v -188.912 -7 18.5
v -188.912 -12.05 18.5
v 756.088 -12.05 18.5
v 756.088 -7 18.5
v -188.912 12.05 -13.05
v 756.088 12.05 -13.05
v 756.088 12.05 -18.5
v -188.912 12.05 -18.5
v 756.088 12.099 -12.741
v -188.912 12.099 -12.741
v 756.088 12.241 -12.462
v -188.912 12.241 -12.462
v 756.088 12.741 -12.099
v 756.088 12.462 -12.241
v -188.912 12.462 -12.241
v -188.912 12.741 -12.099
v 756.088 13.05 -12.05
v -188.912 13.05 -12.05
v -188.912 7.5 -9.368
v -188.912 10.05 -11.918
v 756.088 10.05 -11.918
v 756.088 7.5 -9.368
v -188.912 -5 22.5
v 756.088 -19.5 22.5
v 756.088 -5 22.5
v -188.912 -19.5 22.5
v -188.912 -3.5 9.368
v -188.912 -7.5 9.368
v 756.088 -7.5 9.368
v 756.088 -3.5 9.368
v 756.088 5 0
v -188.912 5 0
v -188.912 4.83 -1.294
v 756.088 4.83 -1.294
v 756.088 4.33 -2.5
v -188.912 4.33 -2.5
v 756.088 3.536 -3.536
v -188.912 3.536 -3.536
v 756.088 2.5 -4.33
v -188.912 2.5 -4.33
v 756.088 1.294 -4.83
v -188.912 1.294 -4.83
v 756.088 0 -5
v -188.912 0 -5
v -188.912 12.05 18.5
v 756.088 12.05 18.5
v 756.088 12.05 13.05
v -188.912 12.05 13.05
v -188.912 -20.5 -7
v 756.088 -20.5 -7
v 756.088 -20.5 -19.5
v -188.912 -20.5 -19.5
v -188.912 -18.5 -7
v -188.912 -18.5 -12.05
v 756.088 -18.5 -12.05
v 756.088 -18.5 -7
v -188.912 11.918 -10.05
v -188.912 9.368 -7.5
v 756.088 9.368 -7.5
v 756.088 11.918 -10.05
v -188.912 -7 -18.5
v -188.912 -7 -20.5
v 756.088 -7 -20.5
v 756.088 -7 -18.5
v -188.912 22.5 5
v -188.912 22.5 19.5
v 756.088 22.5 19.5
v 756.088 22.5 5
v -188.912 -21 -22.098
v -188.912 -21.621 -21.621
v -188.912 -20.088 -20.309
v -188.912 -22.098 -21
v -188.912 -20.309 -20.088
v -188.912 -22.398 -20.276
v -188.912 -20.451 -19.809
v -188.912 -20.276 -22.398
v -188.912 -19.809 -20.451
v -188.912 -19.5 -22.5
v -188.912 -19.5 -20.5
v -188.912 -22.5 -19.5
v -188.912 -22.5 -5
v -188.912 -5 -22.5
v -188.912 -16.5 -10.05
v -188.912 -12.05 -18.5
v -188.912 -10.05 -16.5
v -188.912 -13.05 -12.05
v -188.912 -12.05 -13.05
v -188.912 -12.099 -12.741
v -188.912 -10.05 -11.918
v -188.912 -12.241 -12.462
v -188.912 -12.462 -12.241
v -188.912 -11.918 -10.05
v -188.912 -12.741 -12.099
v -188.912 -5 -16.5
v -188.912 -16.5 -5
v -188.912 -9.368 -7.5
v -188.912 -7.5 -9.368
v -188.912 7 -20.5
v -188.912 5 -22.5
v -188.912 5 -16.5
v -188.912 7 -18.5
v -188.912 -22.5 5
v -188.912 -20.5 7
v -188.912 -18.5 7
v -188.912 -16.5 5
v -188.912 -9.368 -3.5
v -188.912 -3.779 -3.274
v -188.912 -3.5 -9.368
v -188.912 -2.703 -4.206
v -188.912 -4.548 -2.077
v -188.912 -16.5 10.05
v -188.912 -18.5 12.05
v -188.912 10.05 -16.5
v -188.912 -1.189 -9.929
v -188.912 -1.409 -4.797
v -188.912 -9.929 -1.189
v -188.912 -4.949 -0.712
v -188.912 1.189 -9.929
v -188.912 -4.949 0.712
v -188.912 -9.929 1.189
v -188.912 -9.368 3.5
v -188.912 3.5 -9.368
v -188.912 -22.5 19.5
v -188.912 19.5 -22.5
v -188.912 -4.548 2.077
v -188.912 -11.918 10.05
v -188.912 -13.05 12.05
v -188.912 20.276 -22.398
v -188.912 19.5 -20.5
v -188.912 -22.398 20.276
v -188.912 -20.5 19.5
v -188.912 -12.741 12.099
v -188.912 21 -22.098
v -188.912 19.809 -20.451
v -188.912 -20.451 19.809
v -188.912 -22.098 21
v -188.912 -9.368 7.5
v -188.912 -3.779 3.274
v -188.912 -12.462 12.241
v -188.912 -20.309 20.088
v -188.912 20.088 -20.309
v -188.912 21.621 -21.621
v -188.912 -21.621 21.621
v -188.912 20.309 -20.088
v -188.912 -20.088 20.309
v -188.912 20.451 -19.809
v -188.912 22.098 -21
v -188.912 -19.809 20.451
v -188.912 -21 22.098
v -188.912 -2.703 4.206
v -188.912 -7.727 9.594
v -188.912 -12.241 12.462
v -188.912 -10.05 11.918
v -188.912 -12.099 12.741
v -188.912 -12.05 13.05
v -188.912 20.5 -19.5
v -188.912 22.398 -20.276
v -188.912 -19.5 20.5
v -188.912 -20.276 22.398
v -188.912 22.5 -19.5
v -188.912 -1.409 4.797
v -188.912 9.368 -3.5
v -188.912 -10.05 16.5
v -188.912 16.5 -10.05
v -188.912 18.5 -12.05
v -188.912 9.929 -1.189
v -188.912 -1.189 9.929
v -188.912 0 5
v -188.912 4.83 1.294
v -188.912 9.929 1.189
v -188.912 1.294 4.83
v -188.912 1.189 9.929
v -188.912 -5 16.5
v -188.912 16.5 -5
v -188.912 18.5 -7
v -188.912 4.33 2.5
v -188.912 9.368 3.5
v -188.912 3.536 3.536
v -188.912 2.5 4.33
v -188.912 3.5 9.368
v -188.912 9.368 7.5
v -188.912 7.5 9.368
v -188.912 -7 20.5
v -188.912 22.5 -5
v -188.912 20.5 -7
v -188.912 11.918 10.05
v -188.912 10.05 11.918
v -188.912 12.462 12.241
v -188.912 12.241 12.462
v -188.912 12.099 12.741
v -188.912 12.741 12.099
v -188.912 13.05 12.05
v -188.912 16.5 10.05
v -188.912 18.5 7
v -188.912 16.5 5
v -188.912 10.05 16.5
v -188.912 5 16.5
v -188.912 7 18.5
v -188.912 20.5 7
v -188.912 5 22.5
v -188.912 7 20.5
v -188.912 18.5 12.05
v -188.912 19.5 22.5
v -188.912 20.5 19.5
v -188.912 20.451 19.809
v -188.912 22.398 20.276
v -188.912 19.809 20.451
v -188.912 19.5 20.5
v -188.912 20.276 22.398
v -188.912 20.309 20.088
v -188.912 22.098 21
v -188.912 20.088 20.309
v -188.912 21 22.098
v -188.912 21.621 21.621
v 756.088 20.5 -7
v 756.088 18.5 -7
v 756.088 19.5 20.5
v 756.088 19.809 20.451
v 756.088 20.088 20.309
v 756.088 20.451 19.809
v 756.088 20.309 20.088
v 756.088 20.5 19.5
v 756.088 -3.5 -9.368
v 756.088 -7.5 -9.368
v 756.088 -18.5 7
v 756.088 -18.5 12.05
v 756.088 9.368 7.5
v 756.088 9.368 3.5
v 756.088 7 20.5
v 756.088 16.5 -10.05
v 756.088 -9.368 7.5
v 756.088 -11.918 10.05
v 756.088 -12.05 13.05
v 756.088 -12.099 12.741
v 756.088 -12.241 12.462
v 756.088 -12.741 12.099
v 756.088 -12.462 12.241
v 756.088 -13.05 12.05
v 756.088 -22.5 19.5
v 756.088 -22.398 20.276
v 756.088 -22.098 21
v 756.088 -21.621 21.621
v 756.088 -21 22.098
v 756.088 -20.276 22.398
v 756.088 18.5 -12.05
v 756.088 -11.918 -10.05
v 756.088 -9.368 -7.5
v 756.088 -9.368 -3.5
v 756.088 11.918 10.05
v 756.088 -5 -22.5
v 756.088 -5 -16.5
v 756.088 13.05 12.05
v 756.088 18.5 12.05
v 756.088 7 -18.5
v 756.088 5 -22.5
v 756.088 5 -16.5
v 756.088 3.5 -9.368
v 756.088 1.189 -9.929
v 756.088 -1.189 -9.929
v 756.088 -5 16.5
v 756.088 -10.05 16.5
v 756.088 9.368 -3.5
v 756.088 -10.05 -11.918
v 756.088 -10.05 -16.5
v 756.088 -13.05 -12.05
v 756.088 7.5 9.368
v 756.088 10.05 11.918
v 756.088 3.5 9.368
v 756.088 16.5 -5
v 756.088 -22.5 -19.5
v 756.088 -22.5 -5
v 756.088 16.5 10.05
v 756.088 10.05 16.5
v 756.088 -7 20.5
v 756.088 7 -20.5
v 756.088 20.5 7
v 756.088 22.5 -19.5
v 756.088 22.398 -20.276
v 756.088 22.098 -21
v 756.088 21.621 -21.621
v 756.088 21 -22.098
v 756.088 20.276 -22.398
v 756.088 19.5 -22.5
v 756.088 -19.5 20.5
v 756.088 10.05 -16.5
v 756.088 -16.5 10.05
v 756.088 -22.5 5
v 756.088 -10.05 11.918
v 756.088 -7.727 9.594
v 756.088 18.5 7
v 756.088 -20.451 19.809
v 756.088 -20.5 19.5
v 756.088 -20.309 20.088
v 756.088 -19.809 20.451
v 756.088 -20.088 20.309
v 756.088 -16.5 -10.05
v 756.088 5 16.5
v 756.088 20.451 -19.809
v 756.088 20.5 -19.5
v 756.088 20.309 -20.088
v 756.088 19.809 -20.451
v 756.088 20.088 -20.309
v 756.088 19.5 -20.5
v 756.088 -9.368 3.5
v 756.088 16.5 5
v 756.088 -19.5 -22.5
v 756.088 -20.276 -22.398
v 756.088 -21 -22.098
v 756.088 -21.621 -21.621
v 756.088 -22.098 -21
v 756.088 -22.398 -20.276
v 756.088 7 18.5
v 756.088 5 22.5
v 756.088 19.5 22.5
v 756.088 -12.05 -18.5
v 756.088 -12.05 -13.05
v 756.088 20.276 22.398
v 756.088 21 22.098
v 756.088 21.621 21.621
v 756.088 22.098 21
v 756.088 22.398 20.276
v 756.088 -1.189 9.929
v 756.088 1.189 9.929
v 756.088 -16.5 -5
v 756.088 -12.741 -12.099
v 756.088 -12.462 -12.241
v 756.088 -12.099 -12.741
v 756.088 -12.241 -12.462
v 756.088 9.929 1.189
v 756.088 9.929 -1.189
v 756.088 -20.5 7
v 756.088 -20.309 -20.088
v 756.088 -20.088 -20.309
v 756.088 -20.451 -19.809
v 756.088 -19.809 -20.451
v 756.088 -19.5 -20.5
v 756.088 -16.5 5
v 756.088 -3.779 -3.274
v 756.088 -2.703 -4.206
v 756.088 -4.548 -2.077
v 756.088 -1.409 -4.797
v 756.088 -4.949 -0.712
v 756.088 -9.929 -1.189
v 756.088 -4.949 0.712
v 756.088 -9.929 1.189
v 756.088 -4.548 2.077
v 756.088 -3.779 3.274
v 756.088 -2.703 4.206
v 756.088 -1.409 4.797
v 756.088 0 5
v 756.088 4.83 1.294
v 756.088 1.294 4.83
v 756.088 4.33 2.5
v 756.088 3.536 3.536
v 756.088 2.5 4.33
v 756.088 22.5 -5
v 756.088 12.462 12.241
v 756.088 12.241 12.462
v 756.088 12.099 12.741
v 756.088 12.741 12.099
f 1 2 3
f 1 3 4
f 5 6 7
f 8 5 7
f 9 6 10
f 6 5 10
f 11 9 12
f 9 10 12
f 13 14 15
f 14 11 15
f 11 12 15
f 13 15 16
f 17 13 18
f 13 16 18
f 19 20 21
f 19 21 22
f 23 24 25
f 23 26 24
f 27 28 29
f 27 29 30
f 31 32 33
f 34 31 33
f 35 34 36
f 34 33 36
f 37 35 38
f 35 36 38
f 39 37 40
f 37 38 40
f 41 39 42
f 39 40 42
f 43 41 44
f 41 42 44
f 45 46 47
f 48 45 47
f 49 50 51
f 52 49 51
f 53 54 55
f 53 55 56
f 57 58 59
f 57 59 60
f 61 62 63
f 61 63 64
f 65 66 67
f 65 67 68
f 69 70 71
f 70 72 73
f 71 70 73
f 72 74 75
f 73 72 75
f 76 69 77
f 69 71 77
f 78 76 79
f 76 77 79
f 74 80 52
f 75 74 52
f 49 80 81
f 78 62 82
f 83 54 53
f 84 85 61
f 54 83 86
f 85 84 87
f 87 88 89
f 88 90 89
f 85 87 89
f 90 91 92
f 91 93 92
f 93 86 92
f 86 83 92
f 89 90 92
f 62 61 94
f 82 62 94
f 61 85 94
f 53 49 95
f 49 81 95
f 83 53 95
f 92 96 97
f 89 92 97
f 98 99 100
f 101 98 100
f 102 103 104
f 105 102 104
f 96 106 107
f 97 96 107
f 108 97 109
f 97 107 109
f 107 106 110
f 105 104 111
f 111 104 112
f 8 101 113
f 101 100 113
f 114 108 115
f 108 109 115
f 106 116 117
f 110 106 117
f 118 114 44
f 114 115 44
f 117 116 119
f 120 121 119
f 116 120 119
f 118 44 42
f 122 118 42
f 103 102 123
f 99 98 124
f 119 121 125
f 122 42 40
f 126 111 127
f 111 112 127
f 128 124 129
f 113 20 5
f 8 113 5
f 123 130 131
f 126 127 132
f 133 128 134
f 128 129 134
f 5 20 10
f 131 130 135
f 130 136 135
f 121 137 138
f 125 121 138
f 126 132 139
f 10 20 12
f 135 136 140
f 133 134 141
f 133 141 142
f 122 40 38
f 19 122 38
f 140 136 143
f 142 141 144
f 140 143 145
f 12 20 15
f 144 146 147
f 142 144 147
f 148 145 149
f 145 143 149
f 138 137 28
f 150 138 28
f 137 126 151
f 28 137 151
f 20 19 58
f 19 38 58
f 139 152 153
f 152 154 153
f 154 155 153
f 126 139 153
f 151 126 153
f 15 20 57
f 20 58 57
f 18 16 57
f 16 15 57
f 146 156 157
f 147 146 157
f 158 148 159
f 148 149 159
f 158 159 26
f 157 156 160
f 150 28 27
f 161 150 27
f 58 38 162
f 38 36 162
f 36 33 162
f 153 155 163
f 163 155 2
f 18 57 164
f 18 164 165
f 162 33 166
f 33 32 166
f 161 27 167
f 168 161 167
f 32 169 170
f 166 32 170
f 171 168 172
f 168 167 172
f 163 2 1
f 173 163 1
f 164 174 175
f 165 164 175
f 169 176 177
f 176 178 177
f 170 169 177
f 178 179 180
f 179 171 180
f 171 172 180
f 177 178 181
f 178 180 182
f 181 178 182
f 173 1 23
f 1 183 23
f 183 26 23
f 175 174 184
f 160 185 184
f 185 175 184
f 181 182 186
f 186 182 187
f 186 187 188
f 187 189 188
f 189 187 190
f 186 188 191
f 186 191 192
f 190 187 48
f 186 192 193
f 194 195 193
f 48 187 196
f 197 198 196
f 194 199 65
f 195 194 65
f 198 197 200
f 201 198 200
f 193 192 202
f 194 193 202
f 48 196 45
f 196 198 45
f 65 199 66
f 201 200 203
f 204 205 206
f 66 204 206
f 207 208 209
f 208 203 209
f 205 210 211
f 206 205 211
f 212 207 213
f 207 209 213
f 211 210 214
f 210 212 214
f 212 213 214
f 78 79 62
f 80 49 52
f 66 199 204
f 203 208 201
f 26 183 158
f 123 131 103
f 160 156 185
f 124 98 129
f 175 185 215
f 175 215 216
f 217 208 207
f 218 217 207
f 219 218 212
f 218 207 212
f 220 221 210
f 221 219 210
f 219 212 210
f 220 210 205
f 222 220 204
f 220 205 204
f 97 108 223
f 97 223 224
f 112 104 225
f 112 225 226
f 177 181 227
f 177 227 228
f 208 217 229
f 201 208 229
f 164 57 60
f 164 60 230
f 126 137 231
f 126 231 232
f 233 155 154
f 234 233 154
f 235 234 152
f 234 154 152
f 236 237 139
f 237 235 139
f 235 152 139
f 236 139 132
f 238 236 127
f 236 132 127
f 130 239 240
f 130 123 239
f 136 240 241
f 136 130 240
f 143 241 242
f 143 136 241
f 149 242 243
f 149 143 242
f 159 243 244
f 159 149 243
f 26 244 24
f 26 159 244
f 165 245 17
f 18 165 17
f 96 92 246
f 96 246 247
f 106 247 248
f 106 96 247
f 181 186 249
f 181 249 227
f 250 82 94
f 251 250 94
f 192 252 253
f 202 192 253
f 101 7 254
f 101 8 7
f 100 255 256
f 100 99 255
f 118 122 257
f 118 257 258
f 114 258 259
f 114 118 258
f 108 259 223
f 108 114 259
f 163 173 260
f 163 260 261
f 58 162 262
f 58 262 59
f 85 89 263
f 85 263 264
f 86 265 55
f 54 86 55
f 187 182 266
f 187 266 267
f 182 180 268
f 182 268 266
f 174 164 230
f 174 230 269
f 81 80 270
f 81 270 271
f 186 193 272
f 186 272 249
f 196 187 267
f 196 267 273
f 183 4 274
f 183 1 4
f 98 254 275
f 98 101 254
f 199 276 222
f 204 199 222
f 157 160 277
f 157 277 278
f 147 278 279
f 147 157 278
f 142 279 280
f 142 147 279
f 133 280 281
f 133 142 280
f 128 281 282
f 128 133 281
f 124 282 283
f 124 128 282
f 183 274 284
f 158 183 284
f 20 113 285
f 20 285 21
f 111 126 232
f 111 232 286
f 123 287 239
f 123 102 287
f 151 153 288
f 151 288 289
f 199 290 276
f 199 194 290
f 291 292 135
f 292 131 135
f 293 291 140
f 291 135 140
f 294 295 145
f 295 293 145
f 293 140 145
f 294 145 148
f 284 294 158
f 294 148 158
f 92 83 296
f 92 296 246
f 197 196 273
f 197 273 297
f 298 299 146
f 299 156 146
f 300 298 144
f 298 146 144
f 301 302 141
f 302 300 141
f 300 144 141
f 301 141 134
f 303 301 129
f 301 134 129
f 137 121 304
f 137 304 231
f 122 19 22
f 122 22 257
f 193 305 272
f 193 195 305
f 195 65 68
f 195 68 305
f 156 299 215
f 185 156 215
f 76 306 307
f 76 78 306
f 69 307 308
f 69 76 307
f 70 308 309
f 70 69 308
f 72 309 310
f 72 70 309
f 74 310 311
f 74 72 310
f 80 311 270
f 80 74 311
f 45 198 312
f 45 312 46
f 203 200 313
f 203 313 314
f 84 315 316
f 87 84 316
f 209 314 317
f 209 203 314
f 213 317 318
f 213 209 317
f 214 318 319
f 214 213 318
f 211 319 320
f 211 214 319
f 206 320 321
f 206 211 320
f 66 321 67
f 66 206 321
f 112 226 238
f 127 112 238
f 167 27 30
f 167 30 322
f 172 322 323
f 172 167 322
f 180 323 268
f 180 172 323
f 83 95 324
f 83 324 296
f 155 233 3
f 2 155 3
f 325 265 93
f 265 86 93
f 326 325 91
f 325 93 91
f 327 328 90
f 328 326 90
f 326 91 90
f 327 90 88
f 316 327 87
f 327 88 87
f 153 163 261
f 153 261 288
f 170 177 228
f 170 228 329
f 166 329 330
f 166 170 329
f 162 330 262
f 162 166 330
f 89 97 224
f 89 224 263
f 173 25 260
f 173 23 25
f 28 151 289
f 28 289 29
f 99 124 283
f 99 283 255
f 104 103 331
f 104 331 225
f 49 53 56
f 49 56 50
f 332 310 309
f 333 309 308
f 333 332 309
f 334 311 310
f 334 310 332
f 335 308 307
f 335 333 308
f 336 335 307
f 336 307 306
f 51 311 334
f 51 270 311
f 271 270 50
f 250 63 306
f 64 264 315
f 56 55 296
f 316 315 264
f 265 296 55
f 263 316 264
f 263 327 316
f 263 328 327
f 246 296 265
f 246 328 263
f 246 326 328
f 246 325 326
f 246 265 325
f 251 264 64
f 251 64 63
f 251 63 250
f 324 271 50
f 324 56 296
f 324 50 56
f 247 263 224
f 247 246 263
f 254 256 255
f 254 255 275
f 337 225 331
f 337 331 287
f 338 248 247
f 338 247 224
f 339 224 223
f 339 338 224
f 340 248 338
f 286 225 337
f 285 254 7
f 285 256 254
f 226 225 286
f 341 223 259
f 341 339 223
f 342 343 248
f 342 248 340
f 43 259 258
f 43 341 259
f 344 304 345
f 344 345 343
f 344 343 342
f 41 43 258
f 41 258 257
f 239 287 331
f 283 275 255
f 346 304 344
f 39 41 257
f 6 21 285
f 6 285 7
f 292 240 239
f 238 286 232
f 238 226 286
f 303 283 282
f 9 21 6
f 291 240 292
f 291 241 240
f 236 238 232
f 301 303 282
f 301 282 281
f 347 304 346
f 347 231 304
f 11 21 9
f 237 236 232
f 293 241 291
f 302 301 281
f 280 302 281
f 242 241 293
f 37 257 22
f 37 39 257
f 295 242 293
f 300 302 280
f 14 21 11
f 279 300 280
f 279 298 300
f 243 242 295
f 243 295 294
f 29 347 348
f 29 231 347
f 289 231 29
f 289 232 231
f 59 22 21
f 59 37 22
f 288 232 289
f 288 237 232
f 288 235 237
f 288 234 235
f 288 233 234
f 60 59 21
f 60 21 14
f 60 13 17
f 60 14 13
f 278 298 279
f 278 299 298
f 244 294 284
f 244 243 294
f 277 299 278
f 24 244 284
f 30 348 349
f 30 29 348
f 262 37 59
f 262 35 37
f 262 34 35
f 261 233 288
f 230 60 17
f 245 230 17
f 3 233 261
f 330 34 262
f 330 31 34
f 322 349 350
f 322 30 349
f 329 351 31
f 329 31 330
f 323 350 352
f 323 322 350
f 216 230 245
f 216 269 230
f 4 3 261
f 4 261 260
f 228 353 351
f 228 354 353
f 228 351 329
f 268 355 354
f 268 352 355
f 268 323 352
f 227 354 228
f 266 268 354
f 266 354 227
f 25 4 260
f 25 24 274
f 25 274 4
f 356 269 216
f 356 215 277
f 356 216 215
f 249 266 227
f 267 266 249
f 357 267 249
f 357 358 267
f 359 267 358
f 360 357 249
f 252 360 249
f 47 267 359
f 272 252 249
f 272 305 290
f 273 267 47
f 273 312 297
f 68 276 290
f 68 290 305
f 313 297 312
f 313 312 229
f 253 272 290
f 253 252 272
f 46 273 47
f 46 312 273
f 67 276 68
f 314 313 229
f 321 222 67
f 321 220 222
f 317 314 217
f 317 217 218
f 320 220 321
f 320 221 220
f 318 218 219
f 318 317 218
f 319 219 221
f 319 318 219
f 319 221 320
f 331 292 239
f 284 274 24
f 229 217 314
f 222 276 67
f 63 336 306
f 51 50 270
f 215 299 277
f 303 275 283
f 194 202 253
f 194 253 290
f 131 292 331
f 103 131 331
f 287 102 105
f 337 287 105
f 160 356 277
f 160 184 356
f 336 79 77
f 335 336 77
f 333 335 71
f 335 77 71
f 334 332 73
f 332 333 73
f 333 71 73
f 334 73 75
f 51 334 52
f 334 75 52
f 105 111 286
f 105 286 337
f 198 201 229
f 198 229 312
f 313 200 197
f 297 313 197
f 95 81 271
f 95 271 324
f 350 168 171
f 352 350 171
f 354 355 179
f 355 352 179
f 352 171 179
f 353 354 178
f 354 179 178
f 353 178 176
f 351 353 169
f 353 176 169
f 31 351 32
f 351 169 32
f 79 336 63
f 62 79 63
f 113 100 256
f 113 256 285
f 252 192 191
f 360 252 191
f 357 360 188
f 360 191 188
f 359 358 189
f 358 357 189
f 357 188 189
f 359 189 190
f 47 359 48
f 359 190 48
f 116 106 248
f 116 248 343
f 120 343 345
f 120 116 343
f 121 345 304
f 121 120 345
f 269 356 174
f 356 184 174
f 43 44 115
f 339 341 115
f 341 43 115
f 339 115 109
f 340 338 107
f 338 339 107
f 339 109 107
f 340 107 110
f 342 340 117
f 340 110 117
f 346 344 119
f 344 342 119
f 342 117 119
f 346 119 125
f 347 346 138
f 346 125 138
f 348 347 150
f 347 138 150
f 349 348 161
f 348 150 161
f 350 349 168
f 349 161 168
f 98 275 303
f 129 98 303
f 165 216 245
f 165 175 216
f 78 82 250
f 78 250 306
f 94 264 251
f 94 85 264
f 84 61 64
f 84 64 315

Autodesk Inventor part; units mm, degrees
ref_plane "YZ Plane" through (0, 0, 0) normal (1, 0, 0) x (0, 1, 0)
ref_plane "XZ Plane" through (0, 0, 0) normal (0, 1, 0) x (-1, 0, 0)
ref_plane "Work Plane1" through (-188.9125, 0, 0) normal (1, 0, 0) x (0, 1, 0)
sketch "Sketch1" plane through (-188.9125, 0, 0) normal (1, 0, 0) x (0, 1, 0)
  line L0 (-22.5, -5) -> (-16.5, -5) projected
  line L1 (-16.5, -5) -> (-16.5, -10.05) projected
  line L2 (-16.5, -10.05) -> (-11.9175, -10.05) projected
  line L3 (-11.9175, -10.05) -> (-9.3675, -7.5) projected
  line L4 (-9.3675, -7.5) -> (-9.3675, -3.5) projected
  arc A0 (-9.3675, 3.5) -> (-9.3675, -3.5) centre (0, 0) ccw projected
  line L5 (-9.3675, 3.5) -> (-9.3675, 7.5) projected
  line L6 (-9.3675, 7.5) -> (-11.9175, 10.05) projected
  line L7 (-11.9175, 10.05) -> (-16.5, 10.05) projected
  line L8 (-16.5, 10.05) -> (-16.5, 5) projected
  line L9 (-22.5, 5) -> (-16.5, 5) projected
  line L10 (-22.5, 5) -> (-22.5, 19.5) projected
  arc A1 (-19.5, 22.5) -> (-22.5, 19.5) centre (-19.5, 19.5) ccw projected
  line L11 (-19.5, 22.5) -> (-5, 22.5) projected
  line L12 (-5, 22.5) -> (-5, 16.5) projected
  line L13 (-5, 16.5) -> (-10.05, 16.5) projected
  line L14 (-10.05, 16.5) -> (-10.05, 11.9175) projected
  line L15 (-10.05, 11.9175) -> (-7.5, 9.3675) projected
  line L16 (-7.5, 9.3675) -> (-3.5, 9.3675) projected
  arc A2 (3.5, 9.3675) -> (-3.5, 9.3675) centre (0, 0) ccw projected
  line L17 (3.5, 9.3675) -> (7.5, 9.3675) projected
  line L18 (7.5, 9.3675) -> (10.05, 11.9175) projected
  line L19 (10.05, 11.9175) -> (10.05, 16.5) projected
  line L20 (10.05, 16.5) -> (5, 16.5) projected
  line L21 (5, 22.5) -> (5, 16.5) projected
  line L22 (5, 22.5) -> (19.5, 22.5) projected
  arc A3 (22.5, 19.5) -> (19.5, 22.5) centre (19.5, 19.5) ccw projected
  line L23 (22.5, 19.5) -> (22.5, 5) projected
  line L24 (22.5, 5) -> (16.5, 5) projected
  line L25 (16.5, 5) -> (16.5, 10.05) projected
  line L26 (16.5, 10.05) -> (11.9175, 10.05) projected
  line L27 (11.9175, 10.05) -> (9.3675, 7.5) projected
  line L28 (9.3675, 7.5) -> (9.3675, 3.5) projected
  arc A4 (9.3675, -3.5) -> (9.3675, 3.5) centre (0, 0) ccw projected
  line L29 (9.3675, -3.5) -> (9.3675, -7.5) projected
  line L30 (9.3675, -7.5) -> (11.9175, -10.05) projected
  line L31 (11.9175, -10.05) -> (16.5, -10.05) projected
  line L32 (16.5, -10.05) -> (16.5, -5) projected
  line L33 (22.5, -5) -> (16.5, -5) projected
  line L34 (22.5, -5) -> (22.5, -19.5) projected
  arc A5 (19.5, -22.5) -> (22.5, -19.5) centre (19.5, -19.5) ccw projected
  line L35 (19.5, -22.5) -> (5, -22.5) projected
  line L36 (5, -22.5) -> (5, -16.5) projected
  line L37 (5, -16.5) -> (10.05, -16.5) projected
  line L38 (10.05, -16.5) -> (10.05, -11.9175) projected
  line L39 (10.05, -11.9175) -> (7.5, -9.3675) projected
  line L40 (7.5, -9.3675) -> (3.5, -9.3675) projected
  arc A6 (-3.5, -9.3675) -> (3.5, -9.3675) centre (0, 0) ccw projected
  line L41 (-3.5, -9.3675) -> (-7.5, -9.3675) projected
  line L42 (-7.5, -9.3675) -> (-10.05, -11.9175) projected
  line L43 (-10.05, -11.9175) -> (-10.05, -16.5) projected
  line L44 (-10.05, -16.5) -> (-5, -16.5) projected
  line L45 (-5, -22.5) -> (-5, -16.5) projected
  line L46 (-5, -22.5) -> (-19.5, -22.5) projected
  arc A7 (-22.5, -19.5) -> (-19.5, -22.5) centre (-19.5, -19.5) ccw projected
  line L47 (-22.5, -19.5) -> (-22.5, -5) projected
  arc A8 (0, 5) -> (0, -5) centre (0, 0) ccw projected
  arc A9 (0, -5) -> (0, 5) centre (0, 0) ccw projected
  arc A10 (13.05, -12.05) -> (12.05, -13.05) centre (13.05, -13.05) ccw projected
  line L48 (12.05, -13.05) -> (12.05, -18.5) projected
  line L49 (12.05, -18.5) -> (7, -18.5) projected
  line L50 (7, -18.5) -> (7, -20.5) projected
  line L51 (7, -20.5) -> (19.5, -20.5) projected
  arc A11 (19.5, -20.5) -> (20.5, -19.5) centre (19.5, -19.5) ccw projected
  line L52 (20.5, -19.5) -> (20.5, -7) projected
  line L53 (20.5, -7) -> (18.5, -7) projected
  line L54 (18.5, -7) -> (18.5, -12.05) projected
  line L55 (18.5, -12.05) -> (13.05, -12.05) projected
  arc A12 (-20.5, -19.5) -> (-19.5, -20.5) centre (-19.5, -19.5) ccw projected
  line L56 (-19.5, -20.5) -> (-7, -20.5) projected
  line L57 (-7, -20.5) -> (-7, -18.5) projected
  line L58 (-7, -18.5) -> (-12.05, -18.5) projected
  line L59 (-12.05, -18.5) -> (-12.05, -13.05) projected
  arc A13 (-12.05, -13.05) -> (-13.05, -12.05) centre (-13.05, -13.05) ccw projected
  line L60 (-13.05, -12.05) -> (-18.5, -12.05) projected
  line L61 (-18.5, -12.05) -> (-18.5, -7) projected
  line L62 (-18.5, -7) -> (-20.5, -7) projected
  line L63 (-20.5, -7) -> (-20.5, -19.5) projected
  arc A14 (-19.5, 20.5) -> (-20.5, 19.5) centre (-19.5, 19.5) ccw projected
  line L64 (-20.5, 19.5) -> (-20.5, 7) projected
  line L65 (-20.5, 7) -> (-18.5, 7) projected
  line L66 (-18.5, 7) -> (-18.5, 12.05) projected
  line L67 (-18.5, 12.05) -> (-13.05, 12.05) projected
  arc A15 (-13.05, 12.05) -> (-12.05, 13.05) centre (-13.05, 13.05) ccw projected
  line L68 (-12.05, 13.05) -> (-12.05, 18.5) projected
  line L69 (-12.05, 18.5) -> (-7, 18.5) projected
  line L70 (-7, 18.5) -> (-7, 20.5) projected
  line L71 (-7, 20.5) -> (-19.5, 20.5) projected
  line L72 (7, 18.5) -> (12.05, 18.5) projected
  line L73 (12.05, 18.5) -> (12.05, 13.05) projected
  arc A16 (12.05, 13.05) -> (13.05, 12.05) centre (13.05, 13.05) ccw projected
  line L74 (13.05, 12.05) -> (18.5, 12.05) projected
  line L75 (18.5, 12.05) -> (18.5, 7) projected
  line L76 (18.5, 7) -> (20.5, 7) projected
  line L77 (20.5, 7) -> (20.5, 19.5) projected
  arc A17 (20.5, 19.5) -> (19.5, 20.5) centre (19.5, 19.5) ccw projected
  line L78 (19.5, 20.5) -> (7, 20.5) projected
  line L79 (7, 20.5) -> (7, 18.5) projected
  line L80 (5, -22.5) -> (19.5, -22.5)
  line L81 (19.5, -20.5) -> (7, -20.5)
  line L82 (7, -20.5) -> (7, -18.5)
  line L83 (7, -18.5) -> (12.05, -18.5)
  line L84 (12.05, -18.5) -> (12.05, -13.05)
  line L85 (18.5, -12.05) -> (13.05, -12.05)
  line L86 (18.5, -12.05) -> (18.5, -7)
  line L87 (18.5, -7) -> (20.5, -7)
  line L88 (20.5, -7) -> (20.5, -19.5)
  line L89 (22.5, -19.5) -> (22.5, -5)
  line L90 (22.5, -5) -> (16.5, -5)
  line L91 (11.9175, -10.05) -> (16.5, -10.05)
  line L92 (16.5, -10.05) -> (16.5, -5)
  line L93 (11.9175, -10.05) -> (9.3675, -7.5)
  line L94 (7.5, -9.3675) -> (10.05, -11.9175)
  line L95 (10.05, -11.9175) -> (10.05, -16.5)
  line L96 (10.05, -16.5) -> (5, -16.5)
  line L97 (5, -22.5) -> (5, -16.5)
  line L98 (7.5, -9.3675) -> (3.5, -9.3675)
  line L99 (9.3675, -7.5) -> (9.3675, -3.5)
  line L100 (9.3675, 3.5) -> (9.3675, 7.5)
  line L101 (9.3675, 7.5) -> (11.9175, 10.05)
  line L102 (11.9175, 10.05) -> (16.5, 10.05)
  line L103 (16.5, 10.05) -> (16.5, 5)
  line L104 (16.5, 5) -> (22.5, 5)
  line L105 (22.5, 5) -> (22.5, 19.5)
  line L106 (20.5, 19.5) -> (20.5, 7)
  line L107 (18.5, 7) -> (20.5, 7)
  line L108 (18.5, 7) -> (18.5, 12.05)
  line L109 (18.5, 12.05) -> (13.05, 12.05)
  line L110 (12.05, 13.05) -> (12.05, 18.5)
  line L111 (12.05, 18.5) -> (7, 18.5)
  line L112 (7, 18.5) -> (7, 20.5)
  line L113 (7, 20.5) -> (19.5, 20.5)
  line L114 (19.5, 22.5) -> (5, 22.5)
  line L115 (5, 22.5) -> (5, 16.5)
  line L116 (5, 16.5) -> (10.05, 16.5)
  line L117 (10.05, 16.5) -> (10.05, 11.9175)
  line L118 (10.05, 11.9175) -> (7.5, 9.3675)
  line L119 (7.5, 9.3675) -> (3.5, 9.3675)
  line L120 (-3.5, 9.3675) -> (-7.5, 9.3675)
  line L121 (-7.7267, 9.5942) -> (-10.05, 11.9175)
  line L122 (-10.05, 11.9175) -> (-10.05, 16.5)
  line L123 (-10.05, 16.5) -> (-5, 16.5)
  line L124 (-5, 16.5) -> (-5, 22.5)
  line L125 (-19.5, 22.5) -> (-5, 22.5)
  line L126 (-7, 20.5) -> (-19.5, 20.5)
  line L127 (-7, 20.5) -> (-7, 18.5)
  line L128 (-7, 18.5) -> (-12.05, 18.5)
  line L129 (-12.05, 18.5) -> (-12.05, 13.05)
  line L130 (-13.05, 12.05) -> (-18.5, 12.05)
  line L131 (-18.5, 12.05) -> (-18.5, 7)
  line L132 (-18.5, 7) -> (-20.5, 7)
  line L133 (-20.5, 7) -> (-20.5, 19.5)
  line L134 (-22.5, 19.5) -> (-22.5, 5)
  line L135 (-22.5, 5) -> (-16.5, 5)
  line L136 (-16.5, 5) -> (-16.5, 10.05)
  line L137 (-11.9175, 10.05) -> (-16.5, 10.05)
  line L138 (-11.9175, 10.05) -> (-9.3675, 7.5)
  line L139 (-9.3675, 7.5) -> (-9.3675, 3.5)
  line L140 (-9.3675, -3.5) -> (-9.3675, -7.5)
  line L141 (-9.3675, -7.5) -> (-11.9175, -10.05)
  line L142 (-11.9175, -10.05) -> (-16.5, -10.05)
  line L143 (-16.5, -10.05) -> (-16.5, -5)
  line L144 (-16.5, -5) -> (-22.5, -5)
  line L145 (-22.5, -5) -> (-22.5, -19.5)
  line L146 (-20.5, -7) -> (-20.5, -19.5)
  line L147 (-20.5, -7) -> (-18.5, -7)
  line L148 (-18.5, -7) -> (-18.5, -12.05)
  line L149 (-18.5, -12.05) -> (-13.05, -12.05)
  line L150 (-12.05, -13.05) -> (-12.05, -18.5)
  line L151 (-12.05, -18.5) -> (-7, -18.5)
  line L152 (-7, -18.5) -> (-7, -20.5)
  line L153 (-7, -20.5) -> (-19.5, -20.5)
  line L154 (-19.5, -22.5) -> (-5, -22.5)
  line L155 (-5, -22.5) -> (-5, -16.5)
  line L156 (-5, -16.5) -> (-10.05, -16.5)
  line L157 (-10.05, -16.5) -> (-10.05, -11.9175)
  line L158 (-7.5, -9.3675) -> (-10.05, -11.9175)
  line L159 (-7.5, -9.3675) -> (-3.5, -9.3675)
  arc A18 (-20.5, -19.5) -> (-19.5, -20.5) centre (-19.5, -19.5) ccw
  arc A19 (-22.5, -19.5) -> (-19.5, -22.5) centre (-19.5, -19.5) ccw
  arc A20 (-12.05, -13.05) -> (-13.05, -12.05) centre (-13.05, -13.05) ccw
  circle A21 centre (0, 0) radius 5
  arc A22 (-13.05, 12.05) -> (-12.05, 13.05) centre (-13.05, 13.05) ccw
  arc A23 (-19.5, 20.5) -> (-20.5, 19.5) centre (-19.5, 19.5) ccw
  arc A24 (-19.5, 22.5) -> (-22.5, 19.5) centre (-19.5, 19.5) ccw
  arc A25 (12.05, 13.05) -> (13.05, 12.05) centre (13.05, 13.05) ccw
  arc A26 (20.5, 19.5) -> (19.5, 20.5) centre (19.5, 19.5) ccw
  arc A27 (22.5, 19.5) -> (19.5, 22.5) centre (19.5, 19.5) ccw
  arc A28 (13.05, -12.05) -> (12.05, -13.05) centre (13.05, -13.05) ccw
  arc A29 (19.5, -20.5) -> (20.5, -19.5) centre (19.5, -19.5) ccw
  arc A30 (19.5, -22.5) -> (22.5, -19.5) centre (19.5, -19.5) ccw
  arc A31 (-3.5, -9.3675) -> (3.5, -9.3675) centre (0, 0) ccw
  arc A32 (9.3675, -3.5) -> (9.3675, 3.5) centre (0, 0) ccw
  arc A33 (3.5, 9.3675) -> (-3.5, 9.3675) centre (0, 0) ccw
  arc A34 (-9.3675, 3.5) -> (-9.3675, -3.5) centre (0, 0) ccw
extrude "BOSCH, 45X45" add sketch "Sketch1" along normal blind 945
properties part number "BAR, EXTRUDED ALUM, 45MMX45MM, BOSCH" material "Aluminum, 6061-T6"
